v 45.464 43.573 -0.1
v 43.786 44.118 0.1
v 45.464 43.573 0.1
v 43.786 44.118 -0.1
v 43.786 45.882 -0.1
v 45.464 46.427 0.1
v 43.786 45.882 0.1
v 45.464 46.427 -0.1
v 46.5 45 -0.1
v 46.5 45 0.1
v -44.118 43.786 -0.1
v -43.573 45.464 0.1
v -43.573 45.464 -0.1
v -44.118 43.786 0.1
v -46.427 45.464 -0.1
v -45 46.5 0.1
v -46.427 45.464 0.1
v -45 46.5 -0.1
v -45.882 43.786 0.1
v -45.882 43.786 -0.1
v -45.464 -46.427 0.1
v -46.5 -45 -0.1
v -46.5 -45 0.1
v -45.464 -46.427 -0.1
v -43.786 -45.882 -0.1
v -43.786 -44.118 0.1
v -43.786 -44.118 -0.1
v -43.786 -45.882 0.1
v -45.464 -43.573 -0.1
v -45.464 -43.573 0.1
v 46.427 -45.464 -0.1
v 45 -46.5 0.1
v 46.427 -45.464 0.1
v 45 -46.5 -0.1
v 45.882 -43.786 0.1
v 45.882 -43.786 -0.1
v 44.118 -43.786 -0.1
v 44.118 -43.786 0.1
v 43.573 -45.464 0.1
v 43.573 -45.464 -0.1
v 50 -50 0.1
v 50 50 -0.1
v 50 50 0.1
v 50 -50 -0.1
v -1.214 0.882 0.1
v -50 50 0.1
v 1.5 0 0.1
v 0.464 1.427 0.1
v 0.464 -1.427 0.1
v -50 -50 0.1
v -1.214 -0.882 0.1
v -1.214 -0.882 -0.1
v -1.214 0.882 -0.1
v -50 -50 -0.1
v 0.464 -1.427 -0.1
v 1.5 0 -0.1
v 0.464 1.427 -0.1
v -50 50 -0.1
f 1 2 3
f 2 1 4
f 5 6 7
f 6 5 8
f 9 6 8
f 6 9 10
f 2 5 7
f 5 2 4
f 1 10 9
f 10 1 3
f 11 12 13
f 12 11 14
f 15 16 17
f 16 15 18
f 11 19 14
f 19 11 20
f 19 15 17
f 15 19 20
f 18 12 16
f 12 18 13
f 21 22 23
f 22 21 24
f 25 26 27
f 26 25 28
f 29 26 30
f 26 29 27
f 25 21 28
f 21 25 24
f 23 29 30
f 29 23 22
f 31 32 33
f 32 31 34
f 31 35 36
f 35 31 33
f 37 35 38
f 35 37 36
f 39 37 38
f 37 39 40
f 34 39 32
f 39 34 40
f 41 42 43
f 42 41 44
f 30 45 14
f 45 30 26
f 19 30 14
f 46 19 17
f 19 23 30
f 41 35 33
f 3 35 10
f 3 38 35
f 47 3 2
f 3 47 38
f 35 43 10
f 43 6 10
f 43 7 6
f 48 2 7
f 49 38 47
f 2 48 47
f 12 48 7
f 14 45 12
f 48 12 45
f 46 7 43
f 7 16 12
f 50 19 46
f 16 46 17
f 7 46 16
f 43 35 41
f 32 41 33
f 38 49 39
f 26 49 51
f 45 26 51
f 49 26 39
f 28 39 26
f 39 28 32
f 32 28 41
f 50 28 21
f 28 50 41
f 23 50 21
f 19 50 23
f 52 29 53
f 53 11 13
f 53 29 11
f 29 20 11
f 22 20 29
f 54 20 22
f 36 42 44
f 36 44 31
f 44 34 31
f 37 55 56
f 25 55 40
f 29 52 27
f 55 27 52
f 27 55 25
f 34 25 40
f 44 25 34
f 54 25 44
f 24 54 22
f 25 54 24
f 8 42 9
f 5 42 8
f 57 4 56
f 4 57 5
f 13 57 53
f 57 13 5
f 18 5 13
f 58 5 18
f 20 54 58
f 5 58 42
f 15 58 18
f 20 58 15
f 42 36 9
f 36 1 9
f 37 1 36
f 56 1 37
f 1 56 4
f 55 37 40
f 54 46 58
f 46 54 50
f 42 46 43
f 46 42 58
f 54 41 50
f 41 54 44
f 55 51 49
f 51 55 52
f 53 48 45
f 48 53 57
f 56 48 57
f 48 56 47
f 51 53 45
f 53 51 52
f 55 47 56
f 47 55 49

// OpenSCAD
// file: ../conf/parameters.scad
//rendering
epsilon=0.01;

//model
frame_length=1000;
frame_inner=19;
frame_outer=20;

support_width=100;
support_height=0.2;
support_inner=90;
support_diameter=3;

rack_width=150;
rack_inner=140;
rack_diameter=3;

stand_height=200;
stand_width=200;
stand_diameter=5;
stand_head_height=20;
stand_head_diameter=4;

foot_outer=12;
foot_inner=10;
foot_length=500;

motor_hole_distance=450;
motor_hole_diameter=12;
motor_mount_distance=19;
motor_mount_diameter=3;
// main file
include <../conf/parameters.scad>

module support_plate() {

color("silver")
difference() {

	cube([support_width, support_width, support_height], true);

	cylinder(support_height+epsilon,d=support_diameter, center=true);

	for (i = [0 : 3]) {
		rotate([0,0,i*90])
		translate([support_inner/2, support_inner/2,0])
		cylinder(support_height+epsilon,d=support_diameter, center=true);
	}
}
}

support_plate();
